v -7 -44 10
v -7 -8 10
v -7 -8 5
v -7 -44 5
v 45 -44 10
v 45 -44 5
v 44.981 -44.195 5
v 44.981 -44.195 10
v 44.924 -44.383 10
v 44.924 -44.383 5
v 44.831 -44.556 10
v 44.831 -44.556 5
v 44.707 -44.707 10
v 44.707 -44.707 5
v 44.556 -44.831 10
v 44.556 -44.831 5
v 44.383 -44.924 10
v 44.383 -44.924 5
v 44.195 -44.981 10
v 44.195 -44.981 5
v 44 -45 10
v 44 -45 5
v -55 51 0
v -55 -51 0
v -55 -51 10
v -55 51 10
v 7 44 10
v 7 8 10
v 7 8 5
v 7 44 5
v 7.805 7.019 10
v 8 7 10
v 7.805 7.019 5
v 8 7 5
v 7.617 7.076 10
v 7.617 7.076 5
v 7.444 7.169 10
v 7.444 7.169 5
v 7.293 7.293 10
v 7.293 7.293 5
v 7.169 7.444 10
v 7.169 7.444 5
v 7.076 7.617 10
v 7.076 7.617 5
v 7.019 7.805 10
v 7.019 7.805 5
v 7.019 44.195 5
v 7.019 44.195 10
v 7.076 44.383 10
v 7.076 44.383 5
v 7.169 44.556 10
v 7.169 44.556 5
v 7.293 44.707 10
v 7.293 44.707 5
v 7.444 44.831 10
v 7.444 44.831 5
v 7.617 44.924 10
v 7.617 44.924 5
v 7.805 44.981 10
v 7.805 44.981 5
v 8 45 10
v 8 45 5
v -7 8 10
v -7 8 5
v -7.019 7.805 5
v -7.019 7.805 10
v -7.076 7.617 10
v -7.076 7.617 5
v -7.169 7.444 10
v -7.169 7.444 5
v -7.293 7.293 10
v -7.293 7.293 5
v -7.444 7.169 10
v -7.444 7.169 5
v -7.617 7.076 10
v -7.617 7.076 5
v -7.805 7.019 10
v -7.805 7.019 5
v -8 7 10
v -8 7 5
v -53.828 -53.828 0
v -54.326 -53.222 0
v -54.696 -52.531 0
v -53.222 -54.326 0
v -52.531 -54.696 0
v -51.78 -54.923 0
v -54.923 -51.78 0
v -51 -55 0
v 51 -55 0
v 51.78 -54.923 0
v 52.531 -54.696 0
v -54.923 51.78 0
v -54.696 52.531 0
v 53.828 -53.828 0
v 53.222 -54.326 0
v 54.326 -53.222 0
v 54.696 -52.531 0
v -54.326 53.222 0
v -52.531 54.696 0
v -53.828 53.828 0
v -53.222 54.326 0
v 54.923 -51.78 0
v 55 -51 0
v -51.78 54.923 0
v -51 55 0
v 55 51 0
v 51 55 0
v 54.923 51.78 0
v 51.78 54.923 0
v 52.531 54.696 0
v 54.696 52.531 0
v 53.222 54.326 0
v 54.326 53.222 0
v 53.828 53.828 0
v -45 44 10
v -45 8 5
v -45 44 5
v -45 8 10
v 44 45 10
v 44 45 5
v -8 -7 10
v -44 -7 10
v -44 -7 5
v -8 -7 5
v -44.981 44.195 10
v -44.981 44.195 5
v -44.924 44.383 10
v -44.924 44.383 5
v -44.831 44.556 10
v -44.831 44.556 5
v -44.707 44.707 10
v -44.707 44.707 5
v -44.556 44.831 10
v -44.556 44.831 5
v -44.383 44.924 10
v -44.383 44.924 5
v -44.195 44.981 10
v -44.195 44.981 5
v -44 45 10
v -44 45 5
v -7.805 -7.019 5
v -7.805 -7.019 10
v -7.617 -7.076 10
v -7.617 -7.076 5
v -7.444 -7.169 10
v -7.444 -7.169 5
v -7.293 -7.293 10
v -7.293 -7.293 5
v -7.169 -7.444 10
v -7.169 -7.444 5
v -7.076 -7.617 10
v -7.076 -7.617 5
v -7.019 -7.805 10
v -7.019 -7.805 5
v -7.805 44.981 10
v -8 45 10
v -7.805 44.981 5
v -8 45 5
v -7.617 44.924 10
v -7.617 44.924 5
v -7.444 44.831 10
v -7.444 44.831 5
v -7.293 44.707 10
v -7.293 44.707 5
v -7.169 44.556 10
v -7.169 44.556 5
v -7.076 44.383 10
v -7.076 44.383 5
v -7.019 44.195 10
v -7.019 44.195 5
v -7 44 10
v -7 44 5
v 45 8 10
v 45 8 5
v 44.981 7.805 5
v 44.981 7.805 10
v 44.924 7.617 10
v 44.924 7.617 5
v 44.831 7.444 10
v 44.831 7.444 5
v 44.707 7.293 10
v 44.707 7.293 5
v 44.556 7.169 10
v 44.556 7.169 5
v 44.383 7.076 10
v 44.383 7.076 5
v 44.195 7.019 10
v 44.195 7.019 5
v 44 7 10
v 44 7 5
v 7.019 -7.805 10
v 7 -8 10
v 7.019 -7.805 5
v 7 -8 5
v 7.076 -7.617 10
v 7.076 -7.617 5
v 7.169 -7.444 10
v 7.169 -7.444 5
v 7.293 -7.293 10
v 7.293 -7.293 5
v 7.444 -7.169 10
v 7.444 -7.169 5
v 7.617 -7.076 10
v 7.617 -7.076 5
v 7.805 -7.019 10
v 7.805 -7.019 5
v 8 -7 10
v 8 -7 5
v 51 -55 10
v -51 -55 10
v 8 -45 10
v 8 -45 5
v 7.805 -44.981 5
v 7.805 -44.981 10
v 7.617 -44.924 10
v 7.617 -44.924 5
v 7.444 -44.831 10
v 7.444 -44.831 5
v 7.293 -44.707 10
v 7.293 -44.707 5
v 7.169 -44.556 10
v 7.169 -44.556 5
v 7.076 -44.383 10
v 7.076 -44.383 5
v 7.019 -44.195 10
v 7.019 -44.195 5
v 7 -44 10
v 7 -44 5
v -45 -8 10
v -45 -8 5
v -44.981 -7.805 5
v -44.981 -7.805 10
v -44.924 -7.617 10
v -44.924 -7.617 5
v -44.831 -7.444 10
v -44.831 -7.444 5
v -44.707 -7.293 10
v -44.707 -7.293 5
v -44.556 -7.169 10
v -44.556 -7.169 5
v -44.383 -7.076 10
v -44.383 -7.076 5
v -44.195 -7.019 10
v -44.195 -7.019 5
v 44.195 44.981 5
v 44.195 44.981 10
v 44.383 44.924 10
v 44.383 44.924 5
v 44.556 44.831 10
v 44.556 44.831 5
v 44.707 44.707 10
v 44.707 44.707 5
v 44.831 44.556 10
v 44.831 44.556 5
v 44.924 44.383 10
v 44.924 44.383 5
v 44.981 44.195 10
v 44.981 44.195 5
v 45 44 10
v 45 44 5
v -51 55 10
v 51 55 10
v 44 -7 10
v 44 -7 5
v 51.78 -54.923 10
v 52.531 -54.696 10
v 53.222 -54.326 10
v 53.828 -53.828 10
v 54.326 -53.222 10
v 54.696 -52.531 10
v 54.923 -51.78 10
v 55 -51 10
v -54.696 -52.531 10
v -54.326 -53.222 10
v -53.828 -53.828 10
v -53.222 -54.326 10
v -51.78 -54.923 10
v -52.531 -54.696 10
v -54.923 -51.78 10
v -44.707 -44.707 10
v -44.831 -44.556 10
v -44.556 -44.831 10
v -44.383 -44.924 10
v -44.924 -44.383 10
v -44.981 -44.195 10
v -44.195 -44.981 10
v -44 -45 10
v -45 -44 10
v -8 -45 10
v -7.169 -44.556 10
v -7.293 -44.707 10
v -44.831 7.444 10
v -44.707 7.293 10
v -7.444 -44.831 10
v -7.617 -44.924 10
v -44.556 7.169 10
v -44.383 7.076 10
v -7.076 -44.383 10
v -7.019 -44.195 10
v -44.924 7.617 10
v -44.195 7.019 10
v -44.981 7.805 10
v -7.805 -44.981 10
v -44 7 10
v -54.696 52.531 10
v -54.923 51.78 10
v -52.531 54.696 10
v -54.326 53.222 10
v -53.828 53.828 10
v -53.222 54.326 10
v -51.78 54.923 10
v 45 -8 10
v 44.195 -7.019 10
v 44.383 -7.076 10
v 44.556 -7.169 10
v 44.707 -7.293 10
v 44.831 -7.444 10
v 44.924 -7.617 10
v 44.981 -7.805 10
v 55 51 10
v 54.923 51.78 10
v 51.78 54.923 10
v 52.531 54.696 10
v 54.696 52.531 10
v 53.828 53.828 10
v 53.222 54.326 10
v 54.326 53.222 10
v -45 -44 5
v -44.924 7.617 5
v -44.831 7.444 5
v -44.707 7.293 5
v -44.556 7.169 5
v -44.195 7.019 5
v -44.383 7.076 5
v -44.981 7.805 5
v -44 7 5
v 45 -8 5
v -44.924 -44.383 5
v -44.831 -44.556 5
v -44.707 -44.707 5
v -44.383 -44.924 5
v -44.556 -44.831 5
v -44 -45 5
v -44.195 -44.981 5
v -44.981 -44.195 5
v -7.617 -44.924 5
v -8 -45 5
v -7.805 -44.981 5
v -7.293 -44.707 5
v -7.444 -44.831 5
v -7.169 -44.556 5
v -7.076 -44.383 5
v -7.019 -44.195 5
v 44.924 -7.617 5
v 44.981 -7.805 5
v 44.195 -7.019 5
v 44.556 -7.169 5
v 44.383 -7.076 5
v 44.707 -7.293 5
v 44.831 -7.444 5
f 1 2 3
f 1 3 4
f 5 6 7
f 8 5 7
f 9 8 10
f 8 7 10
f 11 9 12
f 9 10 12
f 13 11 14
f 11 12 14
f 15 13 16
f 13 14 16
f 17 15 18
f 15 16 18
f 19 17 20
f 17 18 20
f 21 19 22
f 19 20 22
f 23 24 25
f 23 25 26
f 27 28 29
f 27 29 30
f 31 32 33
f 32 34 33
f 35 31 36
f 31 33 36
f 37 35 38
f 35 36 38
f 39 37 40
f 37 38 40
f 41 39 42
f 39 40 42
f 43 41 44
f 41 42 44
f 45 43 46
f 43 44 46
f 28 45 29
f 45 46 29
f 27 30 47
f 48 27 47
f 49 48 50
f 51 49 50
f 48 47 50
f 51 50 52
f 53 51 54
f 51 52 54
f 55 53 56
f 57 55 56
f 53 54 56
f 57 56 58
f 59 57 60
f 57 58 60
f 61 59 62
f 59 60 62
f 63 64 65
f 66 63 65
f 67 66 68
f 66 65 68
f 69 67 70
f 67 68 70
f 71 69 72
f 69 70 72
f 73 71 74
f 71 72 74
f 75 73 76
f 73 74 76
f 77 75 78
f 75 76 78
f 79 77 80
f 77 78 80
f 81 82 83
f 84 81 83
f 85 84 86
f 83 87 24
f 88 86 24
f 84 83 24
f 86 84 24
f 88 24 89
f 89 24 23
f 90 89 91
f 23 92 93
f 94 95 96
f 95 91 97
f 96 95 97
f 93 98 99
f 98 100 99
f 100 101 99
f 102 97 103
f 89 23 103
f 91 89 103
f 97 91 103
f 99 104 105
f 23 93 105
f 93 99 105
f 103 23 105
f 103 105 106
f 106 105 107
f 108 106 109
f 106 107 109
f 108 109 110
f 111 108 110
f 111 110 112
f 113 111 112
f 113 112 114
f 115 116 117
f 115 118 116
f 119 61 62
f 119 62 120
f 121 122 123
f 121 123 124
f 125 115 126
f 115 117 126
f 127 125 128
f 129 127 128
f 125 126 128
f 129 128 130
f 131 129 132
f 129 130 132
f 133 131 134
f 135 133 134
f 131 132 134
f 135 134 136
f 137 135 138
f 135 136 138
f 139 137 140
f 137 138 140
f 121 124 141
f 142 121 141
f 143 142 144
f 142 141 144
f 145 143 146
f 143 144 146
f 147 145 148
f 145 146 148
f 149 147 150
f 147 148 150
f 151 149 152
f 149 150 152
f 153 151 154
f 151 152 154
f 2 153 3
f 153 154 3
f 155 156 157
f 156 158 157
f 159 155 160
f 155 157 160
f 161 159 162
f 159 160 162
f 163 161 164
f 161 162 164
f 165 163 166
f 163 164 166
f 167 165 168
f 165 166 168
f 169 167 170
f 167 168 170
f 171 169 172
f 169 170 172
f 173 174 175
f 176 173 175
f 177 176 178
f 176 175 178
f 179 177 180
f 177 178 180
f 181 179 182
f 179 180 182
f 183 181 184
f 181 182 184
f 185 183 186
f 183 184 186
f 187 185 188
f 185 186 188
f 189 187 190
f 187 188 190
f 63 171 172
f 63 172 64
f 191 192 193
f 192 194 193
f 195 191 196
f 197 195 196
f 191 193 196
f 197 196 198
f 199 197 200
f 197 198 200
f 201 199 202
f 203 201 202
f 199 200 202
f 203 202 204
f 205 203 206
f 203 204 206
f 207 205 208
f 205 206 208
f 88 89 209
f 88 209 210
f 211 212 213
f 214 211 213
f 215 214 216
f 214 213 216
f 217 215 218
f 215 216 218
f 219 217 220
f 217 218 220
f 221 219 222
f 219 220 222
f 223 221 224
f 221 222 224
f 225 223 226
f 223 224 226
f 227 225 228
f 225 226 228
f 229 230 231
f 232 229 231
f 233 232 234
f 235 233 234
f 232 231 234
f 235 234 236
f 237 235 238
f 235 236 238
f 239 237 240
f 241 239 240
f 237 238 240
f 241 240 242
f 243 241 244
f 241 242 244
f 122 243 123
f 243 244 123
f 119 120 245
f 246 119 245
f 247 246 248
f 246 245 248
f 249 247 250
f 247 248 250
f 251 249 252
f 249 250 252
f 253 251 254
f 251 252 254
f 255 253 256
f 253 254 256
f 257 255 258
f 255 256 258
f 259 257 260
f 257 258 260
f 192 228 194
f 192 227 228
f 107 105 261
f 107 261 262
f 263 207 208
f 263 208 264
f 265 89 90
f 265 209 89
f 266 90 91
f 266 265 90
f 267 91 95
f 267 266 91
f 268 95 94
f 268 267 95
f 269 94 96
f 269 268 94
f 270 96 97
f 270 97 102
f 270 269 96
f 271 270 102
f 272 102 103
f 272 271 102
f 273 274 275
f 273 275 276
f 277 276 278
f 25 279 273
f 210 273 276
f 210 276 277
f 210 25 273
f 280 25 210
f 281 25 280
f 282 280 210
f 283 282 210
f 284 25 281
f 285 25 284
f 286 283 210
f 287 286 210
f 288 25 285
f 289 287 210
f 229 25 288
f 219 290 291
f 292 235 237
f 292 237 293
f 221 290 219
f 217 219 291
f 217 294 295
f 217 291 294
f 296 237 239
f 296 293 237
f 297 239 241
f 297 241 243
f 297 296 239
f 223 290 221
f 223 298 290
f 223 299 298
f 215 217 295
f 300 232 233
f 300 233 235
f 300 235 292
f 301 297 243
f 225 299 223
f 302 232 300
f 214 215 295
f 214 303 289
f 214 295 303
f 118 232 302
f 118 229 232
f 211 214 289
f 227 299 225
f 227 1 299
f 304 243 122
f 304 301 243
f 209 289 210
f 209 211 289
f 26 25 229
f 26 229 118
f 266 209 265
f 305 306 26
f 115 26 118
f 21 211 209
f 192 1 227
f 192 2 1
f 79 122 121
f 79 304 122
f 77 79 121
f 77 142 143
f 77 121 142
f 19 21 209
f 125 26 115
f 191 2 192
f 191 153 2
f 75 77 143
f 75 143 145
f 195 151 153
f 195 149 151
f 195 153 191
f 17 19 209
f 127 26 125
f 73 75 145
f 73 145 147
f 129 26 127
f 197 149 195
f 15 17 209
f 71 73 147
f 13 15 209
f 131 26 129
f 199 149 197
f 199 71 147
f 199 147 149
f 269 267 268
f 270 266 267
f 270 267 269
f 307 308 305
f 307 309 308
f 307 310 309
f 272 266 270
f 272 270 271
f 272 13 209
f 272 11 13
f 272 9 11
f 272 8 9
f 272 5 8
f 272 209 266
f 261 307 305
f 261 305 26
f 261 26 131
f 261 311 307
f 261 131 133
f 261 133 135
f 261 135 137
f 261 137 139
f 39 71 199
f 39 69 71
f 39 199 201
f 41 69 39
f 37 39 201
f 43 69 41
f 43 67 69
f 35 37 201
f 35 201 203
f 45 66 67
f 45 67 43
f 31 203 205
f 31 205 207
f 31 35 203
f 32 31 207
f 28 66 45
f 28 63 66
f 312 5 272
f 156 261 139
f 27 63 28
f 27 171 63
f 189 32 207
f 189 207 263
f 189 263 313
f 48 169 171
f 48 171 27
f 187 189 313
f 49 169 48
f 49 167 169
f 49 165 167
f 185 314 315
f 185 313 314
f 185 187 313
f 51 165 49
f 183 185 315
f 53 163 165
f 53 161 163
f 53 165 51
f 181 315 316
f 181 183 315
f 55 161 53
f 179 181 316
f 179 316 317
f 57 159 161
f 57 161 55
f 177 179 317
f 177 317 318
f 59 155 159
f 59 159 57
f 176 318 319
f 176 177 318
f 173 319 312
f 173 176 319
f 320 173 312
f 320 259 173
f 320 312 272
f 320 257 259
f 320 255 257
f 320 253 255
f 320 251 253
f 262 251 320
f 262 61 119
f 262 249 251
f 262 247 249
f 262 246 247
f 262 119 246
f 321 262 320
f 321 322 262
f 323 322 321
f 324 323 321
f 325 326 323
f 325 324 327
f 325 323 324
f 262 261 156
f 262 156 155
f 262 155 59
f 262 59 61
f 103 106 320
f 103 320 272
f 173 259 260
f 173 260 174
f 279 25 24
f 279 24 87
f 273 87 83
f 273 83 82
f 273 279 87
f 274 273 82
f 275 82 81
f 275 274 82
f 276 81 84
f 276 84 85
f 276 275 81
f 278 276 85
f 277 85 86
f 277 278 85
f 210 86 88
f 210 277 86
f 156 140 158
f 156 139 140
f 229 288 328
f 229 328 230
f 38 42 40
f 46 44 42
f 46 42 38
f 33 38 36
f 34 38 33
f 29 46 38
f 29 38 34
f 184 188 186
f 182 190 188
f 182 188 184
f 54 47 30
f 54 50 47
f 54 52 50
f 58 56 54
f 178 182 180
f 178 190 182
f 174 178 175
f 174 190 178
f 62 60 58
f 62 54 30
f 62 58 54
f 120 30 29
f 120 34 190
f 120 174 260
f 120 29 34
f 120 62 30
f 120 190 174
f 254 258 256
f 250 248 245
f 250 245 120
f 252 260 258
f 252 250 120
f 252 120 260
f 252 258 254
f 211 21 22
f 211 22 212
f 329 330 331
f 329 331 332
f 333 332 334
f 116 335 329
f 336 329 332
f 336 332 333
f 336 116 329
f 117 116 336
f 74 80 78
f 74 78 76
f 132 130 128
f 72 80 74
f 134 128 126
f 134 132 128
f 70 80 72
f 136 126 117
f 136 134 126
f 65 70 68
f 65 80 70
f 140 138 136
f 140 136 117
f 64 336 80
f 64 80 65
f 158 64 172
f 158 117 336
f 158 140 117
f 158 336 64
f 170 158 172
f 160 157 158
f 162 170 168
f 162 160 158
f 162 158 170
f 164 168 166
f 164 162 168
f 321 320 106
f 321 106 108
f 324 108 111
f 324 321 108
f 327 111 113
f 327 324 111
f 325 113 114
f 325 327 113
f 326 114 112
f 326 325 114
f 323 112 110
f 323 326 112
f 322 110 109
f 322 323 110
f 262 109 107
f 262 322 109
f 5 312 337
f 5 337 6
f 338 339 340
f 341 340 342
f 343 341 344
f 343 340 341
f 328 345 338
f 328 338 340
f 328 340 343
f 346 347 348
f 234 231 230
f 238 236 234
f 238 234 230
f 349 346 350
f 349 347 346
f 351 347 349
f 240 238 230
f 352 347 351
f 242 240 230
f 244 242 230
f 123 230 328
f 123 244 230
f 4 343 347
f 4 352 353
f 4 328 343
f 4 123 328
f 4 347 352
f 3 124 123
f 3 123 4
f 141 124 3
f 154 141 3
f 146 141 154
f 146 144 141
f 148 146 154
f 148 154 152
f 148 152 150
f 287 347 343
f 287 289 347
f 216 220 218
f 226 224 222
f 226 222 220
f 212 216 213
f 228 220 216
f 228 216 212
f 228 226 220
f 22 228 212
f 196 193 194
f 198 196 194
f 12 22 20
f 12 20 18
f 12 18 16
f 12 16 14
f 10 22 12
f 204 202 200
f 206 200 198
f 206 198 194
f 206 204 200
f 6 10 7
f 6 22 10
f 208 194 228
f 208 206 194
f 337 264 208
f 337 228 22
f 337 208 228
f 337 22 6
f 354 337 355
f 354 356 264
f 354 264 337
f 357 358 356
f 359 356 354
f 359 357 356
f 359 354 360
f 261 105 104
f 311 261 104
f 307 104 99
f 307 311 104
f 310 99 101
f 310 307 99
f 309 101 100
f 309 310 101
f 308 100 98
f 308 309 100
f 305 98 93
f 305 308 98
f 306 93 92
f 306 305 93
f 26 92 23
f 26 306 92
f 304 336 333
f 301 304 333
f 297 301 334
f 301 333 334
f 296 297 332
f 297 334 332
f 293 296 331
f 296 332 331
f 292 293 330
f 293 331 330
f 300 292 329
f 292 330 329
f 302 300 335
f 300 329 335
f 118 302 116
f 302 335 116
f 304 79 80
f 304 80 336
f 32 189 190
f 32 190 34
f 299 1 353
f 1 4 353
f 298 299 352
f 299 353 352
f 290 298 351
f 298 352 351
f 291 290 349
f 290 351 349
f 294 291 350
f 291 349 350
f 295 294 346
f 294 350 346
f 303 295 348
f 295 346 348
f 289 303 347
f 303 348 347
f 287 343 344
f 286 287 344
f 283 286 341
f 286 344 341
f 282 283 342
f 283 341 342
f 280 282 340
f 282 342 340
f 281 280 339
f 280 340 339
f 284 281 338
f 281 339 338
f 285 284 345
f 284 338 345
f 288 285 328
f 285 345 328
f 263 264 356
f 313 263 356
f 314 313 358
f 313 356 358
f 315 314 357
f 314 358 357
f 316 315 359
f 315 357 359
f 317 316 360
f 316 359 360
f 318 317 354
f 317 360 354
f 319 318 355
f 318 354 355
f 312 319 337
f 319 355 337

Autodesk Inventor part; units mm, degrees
ref_plane "YZ Plane" through (0, 0, 0) normal (1, 0, 0) x (0, 1, 0)
ref_plane "XZ Plane" through (0, 0, 0) normal (0, 1, 0) x (-1, 0, 0)
ref_plane "XY Plane" through (0, 0, 0) normal (0, 0, 1) x (1, 0, 0)
sketch "Náčrt2" plane through (0, 0, 0) normal (0, 0, 1) x (1, 0, 0)
  line L0 (-77, 0) -> (77, 0) projected
  line L1 (0, -77) -> (0, 77) projected
  line L2 (-55, 55) -> (55, 55)
  line L3 (55, 55) -> (55, -55)
  line L4 (55, -55) -> (-55, -55)
  line L5 (-55, -55) -> (-55, 55)
  point P0 (0, 0)
  dimension "d0" = 110
  dimension "d1" = 110
  dimension "d2" = 55
extrude "Vysunutí1" add sketch "Náčrt2" along normal blind 10
sketch "Náčrt3" plane through (0, 0, 10) normal (0, 0, 1) x (1, 0, 0)
  line L0 (-45, 45) -> (-7, 45)
  line L1 (-7, 45) -> (-7, 7)
  line L2 (-7, 7) -> (-45, 7)
  line L3 (-45, 7) -> (-45, 45)
  line L4 (-77, 0) -> (77, 0) projected
  line L5 (0, -77) -> (0, 77) projected
  line L6 (-55, 55) -> (-55, -55) projected
  line L7 (55, 55) -> (-55, 55) projected
  line L8 (7, 45) -> (45, 45)
  line L9 (7, 7) -> (7, 45)
  line L10 (45, 7) -> (7, 7)
  line L11 (45, 45) -> (45, 7)
  line L12 (-45, -7) -> (-7, -7)
  line L13 (-45, -45) -> (-45, -7)
  line L14 (-7, -45) -> (-45, -45)
  line L15 (-7, -7) -> (-7, -45)
  line L16 (7, -7) -> (45, -7)
  line L17 (7, -45) -> (7, -7)
  line L18 (45, -45) -> (7, -45)
  line L19 (45, -7) -> (45, -45)
  point P0 (0, 0)
  dimension "d5" = 38
  dimension "d6" = 38
  dimension "d7" = 10
  dimension "d8" = 10
  dimension "d11" = 52
  dimension "d14" = 52
extrude "Vysunutí2" cut sketch "Náčrt3" against normal blind 5 contours L0 L1 L2 L3 | L8 L11 L10 L9 | L12 L15 L14 L13 | L16 L19 L18 L17
fillet "Zaoblení1" radius 1 16 edges at (-45, 45, 7.5) (7, 45, 7.5) (-45, -7, 7.5) (7, -7, 7.5) (45, -45, 7.5) (-7, -45, 7.5) (45, 7, 7.5) (-7, 7, 7.5) (45, 45, 7.5) (-7, 45, 7.5) (45, -7, 7.5) (-7, -7, 7.5) (-45, -45, 7.5) (7, -45, 7.5) (7, 7, 7.5) (-45, 7, 7.5)
fillet "Zaoblení2" radius 4 4 edges at (-55, -55, 5) (55, -55, 5) (55, 55, 5) (-55, 55, 5)
equation "\"d1\" = d0"
equation "\"d2\" = 0.5 * d1"
equation "\"d6\" = d5"
equation "\"d8\" = d7"
equation "\"d14\" = d11"
properties part number "Paletka"
